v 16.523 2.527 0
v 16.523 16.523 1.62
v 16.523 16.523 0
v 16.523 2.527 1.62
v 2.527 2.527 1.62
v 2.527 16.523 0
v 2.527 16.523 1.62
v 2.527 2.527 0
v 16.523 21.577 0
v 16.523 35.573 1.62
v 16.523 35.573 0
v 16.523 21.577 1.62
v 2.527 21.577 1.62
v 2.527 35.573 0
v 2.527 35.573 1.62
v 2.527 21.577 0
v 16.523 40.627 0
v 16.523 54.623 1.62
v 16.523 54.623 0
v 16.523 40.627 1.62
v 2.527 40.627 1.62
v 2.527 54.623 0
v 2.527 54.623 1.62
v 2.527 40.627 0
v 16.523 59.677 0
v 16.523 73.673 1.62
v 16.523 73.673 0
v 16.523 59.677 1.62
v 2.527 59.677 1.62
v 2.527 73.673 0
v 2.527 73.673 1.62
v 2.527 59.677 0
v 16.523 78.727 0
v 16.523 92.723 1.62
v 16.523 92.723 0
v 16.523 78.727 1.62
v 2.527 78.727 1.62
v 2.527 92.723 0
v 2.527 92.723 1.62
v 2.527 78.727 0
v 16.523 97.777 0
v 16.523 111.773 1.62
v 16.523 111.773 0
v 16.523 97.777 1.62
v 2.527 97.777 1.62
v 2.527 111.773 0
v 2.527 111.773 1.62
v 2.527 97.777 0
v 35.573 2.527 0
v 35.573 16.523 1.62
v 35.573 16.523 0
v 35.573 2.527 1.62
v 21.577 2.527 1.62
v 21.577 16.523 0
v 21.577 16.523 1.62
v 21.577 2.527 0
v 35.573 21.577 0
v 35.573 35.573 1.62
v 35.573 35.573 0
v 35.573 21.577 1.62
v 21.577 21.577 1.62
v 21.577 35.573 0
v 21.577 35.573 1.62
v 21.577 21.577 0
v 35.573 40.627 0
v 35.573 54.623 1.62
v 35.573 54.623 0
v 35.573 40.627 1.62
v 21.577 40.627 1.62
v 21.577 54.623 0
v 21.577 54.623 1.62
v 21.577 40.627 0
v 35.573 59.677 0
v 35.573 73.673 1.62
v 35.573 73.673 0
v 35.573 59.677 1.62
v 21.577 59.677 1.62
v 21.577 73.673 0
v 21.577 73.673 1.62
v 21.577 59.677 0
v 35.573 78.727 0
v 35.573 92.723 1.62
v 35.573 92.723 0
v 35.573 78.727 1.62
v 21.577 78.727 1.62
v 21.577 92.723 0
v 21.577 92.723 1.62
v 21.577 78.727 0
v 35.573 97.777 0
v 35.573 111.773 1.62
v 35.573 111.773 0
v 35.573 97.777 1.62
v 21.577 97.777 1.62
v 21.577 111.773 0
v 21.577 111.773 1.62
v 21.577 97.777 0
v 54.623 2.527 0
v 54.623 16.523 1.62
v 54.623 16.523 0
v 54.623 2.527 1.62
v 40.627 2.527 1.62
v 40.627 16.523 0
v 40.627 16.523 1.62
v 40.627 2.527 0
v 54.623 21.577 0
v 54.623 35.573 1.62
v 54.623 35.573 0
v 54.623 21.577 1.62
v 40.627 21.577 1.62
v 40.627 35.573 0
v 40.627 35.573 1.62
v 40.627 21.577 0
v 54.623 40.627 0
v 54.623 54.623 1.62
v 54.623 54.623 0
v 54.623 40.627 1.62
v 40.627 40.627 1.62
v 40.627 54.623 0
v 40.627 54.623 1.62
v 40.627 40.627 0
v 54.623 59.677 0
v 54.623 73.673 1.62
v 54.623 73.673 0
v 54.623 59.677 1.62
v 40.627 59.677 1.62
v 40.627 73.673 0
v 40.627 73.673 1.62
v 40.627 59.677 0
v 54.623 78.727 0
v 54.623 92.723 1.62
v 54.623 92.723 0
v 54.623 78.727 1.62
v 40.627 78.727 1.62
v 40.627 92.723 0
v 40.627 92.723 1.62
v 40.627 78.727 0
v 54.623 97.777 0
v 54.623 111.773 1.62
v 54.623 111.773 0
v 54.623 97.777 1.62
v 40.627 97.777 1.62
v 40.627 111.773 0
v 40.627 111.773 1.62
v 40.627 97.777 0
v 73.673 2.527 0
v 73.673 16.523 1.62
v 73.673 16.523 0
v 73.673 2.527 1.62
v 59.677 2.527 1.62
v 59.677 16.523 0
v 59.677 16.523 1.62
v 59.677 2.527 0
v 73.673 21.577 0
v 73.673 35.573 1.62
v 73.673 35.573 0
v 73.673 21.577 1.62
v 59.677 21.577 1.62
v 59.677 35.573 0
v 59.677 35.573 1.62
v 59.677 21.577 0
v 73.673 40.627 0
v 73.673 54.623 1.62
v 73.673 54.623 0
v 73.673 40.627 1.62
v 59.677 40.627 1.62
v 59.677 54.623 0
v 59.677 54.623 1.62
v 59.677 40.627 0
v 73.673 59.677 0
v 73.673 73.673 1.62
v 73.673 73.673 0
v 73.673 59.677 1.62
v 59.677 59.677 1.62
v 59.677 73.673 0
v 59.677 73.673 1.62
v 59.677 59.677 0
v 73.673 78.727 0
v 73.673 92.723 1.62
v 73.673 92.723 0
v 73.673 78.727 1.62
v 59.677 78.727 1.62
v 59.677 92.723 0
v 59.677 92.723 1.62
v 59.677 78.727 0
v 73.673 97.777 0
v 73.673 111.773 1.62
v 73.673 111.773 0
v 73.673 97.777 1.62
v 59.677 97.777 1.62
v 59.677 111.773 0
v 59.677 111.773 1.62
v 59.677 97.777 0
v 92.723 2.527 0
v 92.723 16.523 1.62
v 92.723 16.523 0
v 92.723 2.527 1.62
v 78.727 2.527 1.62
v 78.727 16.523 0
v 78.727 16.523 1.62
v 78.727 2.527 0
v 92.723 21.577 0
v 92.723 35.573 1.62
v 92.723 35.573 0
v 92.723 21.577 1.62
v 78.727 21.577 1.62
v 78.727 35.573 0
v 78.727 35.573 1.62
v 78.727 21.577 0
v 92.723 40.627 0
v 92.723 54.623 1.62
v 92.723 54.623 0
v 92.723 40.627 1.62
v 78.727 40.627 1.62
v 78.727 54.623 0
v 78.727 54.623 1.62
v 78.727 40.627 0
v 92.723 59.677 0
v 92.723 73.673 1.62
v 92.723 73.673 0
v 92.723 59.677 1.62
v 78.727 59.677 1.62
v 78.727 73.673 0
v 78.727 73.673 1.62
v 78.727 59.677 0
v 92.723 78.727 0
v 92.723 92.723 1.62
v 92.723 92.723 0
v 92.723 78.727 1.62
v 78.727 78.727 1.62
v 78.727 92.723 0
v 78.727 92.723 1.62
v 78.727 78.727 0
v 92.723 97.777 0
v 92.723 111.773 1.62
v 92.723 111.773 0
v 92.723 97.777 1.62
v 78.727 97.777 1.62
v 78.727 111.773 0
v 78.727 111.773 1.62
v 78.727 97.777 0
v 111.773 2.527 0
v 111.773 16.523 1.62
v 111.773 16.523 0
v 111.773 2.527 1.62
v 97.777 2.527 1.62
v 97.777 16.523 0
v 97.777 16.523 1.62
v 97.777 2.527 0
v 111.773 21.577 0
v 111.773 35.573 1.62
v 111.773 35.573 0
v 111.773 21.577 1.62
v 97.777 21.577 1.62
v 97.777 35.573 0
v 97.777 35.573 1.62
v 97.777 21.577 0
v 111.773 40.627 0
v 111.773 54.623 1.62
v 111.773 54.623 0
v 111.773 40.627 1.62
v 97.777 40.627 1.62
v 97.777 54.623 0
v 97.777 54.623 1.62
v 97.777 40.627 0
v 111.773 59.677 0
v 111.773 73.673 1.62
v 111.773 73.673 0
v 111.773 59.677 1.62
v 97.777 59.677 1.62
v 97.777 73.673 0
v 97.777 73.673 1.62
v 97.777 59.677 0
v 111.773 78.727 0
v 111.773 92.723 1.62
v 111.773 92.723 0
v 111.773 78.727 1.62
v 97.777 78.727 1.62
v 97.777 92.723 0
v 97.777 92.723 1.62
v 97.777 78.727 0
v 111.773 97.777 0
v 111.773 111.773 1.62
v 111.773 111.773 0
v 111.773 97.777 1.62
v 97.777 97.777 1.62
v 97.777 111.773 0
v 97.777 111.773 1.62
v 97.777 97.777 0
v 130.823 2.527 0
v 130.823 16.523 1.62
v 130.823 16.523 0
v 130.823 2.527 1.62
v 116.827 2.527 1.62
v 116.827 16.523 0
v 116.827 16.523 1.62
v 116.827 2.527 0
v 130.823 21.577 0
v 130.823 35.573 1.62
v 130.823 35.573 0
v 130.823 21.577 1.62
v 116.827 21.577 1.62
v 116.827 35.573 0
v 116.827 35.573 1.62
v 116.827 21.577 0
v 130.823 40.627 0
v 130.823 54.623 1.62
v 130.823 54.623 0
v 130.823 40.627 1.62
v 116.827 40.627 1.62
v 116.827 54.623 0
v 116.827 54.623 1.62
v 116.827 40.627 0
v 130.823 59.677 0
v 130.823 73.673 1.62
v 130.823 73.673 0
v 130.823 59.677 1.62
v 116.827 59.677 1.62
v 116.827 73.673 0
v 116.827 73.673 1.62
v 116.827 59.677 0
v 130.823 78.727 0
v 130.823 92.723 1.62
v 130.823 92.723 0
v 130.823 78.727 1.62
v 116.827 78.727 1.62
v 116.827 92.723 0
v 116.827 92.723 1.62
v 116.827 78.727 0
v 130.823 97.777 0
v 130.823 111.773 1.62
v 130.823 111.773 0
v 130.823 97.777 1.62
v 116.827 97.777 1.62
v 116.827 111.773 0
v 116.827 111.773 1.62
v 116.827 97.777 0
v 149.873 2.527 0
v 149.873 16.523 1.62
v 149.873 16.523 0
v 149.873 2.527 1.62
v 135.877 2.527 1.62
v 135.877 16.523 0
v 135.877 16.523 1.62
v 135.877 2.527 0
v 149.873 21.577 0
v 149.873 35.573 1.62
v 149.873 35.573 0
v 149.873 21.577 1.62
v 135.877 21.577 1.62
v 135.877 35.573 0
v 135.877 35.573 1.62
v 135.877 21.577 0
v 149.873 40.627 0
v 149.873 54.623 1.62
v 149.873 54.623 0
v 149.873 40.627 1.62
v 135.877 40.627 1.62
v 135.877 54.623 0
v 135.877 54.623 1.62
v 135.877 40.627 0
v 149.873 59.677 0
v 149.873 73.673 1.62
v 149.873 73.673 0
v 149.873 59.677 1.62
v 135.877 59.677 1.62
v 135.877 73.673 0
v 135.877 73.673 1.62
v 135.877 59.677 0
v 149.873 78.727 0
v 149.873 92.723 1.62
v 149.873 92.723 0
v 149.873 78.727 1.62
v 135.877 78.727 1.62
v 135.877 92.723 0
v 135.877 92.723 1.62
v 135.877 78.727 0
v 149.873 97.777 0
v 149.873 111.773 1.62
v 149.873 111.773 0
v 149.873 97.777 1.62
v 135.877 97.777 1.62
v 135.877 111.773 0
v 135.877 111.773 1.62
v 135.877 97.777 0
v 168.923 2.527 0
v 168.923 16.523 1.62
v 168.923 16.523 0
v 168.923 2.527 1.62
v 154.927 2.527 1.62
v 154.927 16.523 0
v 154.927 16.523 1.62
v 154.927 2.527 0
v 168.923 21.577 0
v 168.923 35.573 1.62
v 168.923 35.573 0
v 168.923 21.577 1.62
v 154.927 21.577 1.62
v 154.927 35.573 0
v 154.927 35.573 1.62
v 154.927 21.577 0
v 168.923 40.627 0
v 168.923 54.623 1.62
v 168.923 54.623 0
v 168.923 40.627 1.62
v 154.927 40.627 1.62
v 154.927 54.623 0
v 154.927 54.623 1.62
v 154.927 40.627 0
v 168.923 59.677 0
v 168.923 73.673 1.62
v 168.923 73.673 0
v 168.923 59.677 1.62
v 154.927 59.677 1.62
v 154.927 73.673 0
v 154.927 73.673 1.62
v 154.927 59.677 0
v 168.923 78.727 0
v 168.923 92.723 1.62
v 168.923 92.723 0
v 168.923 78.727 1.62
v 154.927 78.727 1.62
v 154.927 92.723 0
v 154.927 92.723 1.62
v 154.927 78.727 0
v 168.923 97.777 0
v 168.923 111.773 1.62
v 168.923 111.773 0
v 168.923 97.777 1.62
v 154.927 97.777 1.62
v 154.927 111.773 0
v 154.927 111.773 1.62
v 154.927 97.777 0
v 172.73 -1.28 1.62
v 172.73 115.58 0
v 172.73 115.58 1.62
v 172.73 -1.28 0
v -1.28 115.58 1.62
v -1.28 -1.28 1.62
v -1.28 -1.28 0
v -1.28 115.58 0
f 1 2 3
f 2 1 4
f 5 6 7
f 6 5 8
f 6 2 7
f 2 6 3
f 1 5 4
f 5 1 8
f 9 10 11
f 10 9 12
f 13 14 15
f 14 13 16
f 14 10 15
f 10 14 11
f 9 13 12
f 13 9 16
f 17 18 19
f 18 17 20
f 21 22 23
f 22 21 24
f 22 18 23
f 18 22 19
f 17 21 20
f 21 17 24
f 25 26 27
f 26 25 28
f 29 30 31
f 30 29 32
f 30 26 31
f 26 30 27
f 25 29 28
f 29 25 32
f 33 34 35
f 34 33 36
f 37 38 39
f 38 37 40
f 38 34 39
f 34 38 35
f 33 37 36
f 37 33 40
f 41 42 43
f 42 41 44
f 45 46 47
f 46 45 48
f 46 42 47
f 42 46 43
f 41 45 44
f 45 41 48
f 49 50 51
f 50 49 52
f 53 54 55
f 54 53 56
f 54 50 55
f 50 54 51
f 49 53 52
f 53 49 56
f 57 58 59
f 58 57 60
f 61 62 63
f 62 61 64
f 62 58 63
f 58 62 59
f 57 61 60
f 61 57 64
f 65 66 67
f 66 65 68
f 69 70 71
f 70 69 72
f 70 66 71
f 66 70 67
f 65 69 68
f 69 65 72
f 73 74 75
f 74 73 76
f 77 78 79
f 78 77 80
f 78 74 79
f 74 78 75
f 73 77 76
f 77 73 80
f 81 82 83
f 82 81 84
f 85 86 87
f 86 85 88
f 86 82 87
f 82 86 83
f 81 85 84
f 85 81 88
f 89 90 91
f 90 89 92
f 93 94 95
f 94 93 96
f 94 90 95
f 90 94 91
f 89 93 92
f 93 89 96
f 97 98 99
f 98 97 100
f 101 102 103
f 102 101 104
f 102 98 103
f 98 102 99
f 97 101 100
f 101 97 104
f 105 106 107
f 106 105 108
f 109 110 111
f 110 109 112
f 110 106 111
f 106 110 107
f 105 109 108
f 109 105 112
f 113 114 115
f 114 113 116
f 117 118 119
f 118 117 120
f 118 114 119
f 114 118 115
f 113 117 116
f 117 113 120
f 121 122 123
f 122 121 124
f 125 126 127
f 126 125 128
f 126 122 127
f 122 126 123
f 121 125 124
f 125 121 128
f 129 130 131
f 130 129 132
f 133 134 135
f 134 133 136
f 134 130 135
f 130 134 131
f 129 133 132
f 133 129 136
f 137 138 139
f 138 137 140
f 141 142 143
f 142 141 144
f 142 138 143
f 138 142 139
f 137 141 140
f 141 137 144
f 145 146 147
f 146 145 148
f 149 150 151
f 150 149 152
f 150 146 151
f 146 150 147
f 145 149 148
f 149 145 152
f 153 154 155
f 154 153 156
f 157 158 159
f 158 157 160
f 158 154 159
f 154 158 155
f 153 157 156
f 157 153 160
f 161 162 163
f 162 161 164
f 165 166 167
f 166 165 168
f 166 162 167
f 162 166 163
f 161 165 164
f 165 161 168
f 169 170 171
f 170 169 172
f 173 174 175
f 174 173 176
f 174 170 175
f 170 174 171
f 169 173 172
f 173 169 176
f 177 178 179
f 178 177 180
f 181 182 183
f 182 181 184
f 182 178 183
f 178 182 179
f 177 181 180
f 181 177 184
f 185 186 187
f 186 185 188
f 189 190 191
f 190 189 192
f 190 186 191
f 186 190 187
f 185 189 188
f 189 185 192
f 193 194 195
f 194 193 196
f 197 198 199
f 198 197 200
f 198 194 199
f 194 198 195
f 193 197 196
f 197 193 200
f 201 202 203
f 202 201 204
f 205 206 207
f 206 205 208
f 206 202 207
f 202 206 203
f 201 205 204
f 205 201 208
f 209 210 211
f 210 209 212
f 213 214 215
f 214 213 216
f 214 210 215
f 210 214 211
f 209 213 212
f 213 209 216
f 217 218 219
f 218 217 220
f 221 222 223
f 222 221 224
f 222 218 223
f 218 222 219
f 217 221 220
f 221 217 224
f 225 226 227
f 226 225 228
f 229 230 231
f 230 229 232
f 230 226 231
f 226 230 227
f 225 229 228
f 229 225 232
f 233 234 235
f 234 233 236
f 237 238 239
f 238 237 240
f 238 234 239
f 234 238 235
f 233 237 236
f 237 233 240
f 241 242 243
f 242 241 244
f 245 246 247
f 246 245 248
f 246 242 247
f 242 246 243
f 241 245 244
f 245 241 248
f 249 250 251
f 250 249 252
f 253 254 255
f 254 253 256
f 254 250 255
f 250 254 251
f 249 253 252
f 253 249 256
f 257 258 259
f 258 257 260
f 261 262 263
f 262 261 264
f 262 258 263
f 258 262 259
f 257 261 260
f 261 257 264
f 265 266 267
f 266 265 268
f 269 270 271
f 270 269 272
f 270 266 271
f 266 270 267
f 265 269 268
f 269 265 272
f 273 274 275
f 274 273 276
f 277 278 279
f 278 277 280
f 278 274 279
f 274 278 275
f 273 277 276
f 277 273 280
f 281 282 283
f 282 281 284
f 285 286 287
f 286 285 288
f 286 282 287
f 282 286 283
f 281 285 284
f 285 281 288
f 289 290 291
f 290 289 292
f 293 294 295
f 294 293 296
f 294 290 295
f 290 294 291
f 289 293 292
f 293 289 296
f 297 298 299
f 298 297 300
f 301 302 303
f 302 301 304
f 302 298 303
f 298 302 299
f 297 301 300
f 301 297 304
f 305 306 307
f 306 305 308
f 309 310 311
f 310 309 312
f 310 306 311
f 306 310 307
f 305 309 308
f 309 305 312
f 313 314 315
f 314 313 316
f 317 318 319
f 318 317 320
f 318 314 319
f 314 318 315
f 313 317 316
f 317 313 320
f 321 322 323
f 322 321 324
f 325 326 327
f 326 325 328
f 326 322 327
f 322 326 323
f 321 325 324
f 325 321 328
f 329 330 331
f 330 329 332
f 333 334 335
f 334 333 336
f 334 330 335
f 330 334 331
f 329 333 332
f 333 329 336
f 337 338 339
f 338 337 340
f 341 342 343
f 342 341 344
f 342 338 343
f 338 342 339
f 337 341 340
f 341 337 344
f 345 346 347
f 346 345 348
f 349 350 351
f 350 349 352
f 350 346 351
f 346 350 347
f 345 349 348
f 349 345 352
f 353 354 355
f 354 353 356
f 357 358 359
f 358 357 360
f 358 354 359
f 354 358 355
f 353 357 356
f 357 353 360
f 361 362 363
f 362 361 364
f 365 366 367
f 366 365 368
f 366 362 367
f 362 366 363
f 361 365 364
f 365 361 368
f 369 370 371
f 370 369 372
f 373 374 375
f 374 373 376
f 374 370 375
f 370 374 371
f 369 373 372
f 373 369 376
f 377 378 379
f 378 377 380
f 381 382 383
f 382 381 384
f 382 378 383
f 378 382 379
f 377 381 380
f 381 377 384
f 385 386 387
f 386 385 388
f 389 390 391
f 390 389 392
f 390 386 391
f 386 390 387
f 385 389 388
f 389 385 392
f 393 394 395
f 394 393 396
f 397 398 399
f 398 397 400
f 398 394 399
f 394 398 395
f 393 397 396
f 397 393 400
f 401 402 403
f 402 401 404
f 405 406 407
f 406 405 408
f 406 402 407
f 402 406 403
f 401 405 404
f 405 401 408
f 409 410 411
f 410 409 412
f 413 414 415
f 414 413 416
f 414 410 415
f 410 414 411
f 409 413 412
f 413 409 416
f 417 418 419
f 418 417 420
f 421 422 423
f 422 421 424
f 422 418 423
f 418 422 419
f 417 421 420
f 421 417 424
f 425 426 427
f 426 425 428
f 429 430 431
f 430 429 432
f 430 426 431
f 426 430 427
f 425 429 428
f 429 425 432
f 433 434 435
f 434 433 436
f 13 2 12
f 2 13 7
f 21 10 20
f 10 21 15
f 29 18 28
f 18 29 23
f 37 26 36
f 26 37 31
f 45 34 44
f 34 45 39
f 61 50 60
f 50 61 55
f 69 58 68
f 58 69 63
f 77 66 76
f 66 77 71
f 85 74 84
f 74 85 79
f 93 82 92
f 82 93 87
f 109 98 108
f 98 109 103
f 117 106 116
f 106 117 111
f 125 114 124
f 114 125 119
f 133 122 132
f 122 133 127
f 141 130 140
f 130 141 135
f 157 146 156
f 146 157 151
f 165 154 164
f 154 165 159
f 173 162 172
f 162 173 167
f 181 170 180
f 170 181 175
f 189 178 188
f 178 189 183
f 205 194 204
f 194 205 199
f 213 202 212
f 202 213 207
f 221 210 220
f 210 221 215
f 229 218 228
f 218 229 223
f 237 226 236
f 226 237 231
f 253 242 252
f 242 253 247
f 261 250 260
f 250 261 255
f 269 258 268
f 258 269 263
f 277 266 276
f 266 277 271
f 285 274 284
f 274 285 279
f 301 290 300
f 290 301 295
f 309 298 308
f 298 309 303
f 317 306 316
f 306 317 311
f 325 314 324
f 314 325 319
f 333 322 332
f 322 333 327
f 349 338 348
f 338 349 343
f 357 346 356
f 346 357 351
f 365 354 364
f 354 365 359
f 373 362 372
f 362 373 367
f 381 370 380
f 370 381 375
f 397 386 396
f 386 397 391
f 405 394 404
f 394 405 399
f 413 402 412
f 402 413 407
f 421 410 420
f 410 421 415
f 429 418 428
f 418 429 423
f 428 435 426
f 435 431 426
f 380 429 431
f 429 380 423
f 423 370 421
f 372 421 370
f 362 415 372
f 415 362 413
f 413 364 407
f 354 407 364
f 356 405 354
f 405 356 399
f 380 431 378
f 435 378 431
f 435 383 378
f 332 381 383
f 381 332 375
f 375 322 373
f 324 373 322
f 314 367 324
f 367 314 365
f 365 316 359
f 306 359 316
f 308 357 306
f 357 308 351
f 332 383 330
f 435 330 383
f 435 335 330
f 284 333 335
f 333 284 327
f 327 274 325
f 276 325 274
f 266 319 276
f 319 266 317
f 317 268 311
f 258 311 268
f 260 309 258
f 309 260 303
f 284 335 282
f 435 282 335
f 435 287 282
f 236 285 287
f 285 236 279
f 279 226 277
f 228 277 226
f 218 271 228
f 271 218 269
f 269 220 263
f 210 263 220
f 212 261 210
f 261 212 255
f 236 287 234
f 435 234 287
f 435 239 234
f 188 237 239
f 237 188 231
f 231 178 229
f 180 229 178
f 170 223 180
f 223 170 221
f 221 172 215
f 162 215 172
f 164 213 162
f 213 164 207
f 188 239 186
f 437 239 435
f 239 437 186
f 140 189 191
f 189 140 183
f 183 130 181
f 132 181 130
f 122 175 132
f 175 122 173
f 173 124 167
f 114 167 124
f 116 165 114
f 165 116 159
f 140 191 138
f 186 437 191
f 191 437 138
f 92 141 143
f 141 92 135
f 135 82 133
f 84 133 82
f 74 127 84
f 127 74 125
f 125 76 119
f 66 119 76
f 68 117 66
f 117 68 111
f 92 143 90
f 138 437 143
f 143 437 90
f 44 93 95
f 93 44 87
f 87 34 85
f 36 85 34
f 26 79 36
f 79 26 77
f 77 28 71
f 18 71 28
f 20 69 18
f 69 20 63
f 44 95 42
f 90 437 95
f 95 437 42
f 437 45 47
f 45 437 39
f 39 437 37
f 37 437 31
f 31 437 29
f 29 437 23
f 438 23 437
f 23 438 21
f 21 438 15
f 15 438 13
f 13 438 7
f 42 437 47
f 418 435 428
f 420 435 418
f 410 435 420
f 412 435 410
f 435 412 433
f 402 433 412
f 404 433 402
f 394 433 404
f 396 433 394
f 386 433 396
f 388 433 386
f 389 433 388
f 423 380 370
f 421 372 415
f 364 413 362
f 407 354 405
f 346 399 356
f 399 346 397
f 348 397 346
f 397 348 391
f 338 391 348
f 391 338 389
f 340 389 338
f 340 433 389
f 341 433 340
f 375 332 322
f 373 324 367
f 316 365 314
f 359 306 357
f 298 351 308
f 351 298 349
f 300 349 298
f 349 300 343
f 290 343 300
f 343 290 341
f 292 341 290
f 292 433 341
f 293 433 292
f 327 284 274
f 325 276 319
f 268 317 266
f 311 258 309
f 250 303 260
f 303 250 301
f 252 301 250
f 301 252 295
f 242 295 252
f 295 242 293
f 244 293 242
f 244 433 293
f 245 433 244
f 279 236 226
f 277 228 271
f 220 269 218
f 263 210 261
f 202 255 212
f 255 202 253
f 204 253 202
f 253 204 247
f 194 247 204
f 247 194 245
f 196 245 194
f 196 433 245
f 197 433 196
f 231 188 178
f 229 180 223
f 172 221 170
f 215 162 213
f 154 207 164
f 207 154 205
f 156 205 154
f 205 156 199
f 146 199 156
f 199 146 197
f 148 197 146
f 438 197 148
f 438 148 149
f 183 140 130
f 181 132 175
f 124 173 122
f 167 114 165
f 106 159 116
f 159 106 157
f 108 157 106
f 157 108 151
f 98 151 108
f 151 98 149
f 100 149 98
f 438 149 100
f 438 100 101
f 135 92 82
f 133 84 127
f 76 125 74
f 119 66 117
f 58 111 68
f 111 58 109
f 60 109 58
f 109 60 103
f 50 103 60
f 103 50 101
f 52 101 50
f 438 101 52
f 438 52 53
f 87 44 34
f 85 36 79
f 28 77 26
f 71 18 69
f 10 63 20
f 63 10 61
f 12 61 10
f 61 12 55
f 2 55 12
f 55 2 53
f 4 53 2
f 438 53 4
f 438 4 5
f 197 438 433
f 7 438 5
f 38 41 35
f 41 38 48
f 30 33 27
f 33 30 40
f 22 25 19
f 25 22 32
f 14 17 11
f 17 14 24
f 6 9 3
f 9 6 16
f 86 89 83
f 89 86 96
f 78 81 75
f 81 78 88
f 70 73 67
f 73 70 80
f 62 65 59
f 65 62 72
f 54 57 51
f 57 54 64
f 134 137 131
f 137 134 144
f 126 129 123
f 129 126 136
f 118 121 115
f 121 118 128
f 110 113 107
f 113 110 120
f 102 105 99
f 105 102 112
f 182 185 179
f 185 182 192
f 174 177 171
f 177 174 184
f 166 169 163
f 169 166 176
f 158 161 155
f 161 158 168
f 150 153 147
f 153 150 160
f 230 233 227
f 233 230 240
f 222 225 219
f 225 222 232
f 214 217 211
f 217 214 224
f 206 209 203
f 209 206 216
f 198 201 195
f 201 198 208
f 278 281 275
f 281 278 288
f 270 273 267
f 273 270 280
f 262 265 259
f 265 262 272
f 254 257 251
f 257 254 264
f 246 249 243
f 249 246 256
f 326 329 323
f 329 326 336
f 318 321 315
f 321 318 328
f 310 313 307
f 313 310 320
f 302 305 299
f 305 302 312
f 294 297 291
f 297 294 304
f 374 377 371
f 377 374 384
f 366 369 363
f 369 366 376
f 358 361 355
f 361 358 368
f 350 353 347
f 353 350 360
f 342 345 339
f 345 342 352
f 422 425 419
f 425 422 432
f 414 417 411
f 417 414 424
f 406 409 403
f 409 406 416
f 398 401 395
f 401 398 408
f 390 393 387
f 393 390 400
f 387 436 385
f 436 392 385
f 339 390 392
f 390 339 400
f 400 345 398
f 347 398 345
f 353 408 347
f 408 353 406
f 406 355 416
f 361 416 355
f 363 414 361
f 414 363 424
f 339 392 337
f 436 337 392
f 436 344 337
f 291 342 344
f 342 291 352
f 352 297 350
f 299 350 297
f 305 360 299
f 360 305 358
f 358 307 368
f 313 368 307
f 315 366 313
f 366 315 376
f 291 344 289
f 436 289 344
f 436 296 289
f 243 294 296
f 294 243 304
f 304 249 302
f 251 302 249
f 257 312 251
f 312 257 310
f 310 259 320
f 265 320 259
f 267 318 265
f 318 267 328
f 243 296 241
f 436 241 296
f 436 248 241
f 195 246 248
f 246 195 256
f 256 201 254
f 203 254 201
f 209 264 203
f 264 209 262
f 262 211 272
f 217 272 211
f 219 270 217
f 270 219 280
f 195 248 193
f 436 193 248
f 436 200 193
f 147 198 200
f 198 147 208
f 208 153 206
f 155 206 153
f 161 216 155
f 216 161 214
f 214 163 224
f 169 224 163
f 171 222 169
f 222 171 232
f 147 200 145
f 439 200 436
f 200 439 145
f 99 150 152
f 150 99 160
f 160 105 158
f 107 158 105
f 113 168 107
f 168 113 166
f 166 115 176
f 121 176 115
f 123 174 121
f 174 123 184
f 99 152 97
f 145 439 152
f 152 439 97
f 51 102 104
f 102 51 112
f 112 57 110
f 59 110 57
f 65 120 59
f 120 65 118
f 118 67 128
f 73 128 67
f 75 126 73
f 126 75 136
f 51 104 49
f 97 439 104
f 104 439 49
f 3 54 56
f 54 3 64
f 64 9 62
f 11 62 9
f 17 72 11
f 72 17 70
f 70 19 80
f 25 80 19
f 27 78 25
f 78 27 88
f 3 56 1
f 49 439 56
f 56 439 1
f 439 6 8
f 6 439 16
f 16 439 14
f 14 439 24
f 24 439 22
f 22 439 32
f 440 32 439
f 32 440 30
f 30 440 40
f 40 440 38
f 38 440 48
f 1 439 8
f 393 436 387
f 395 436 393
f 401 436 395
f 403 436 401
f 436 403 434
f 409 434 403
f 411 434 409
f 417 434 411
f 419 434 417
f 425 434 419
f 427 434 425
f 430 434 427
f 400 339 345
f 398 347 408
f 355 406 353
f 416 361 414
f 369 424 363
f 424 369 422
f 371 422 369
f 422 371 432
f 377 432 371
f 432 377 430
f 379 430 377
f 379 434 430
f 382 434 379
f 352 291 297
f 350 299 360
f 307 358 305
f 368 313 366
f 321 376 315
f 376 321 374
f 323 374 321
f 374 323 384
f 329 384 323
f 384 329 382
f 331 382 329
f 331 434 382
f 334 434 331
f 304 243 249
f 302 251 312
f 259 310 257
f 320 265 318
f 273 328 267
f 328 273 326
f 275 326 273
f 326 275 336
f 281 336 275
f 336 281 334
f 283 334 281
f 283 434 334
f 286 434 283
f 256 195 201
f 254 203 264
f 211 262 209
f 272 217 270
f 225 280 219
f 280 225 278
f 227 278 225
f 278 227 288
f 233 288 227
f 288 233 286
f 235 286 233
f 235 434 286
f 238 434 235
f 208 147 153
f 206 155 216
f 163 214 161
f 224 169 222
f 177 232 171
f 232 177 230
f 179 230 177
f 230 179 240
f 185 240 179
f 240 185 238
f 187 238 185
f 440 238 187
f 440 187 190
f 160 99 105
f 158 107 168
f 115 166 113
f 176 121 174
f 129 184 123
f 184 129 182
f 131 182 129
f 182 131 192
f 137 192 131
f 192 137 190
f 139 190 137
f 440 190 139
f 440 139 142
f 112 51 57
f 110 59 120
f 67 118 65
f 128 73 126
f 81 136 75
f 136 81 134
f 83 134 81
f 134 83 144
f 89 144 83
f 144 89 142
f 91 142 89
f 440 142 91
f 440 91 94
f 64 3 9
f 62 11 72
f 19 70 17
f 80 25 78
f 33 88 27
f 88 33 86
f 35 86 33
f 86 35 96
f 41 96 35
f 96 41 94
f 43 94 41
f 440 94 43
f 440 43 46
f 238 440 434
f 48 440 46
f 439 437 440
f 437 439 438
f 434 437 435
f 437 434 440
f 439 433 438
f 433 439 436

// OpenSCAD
// non-design measurements
key_spacing = 19.05;
key_cutout_w = .551*25.4;

wall_thicc = 1.28;
pcb_thickness = 1.62;
difference(){
    translate([-wall_thicc,-wall_thicc,0])
        cube([key_spacing*9+2*wall_thicc, key_spacing*6+2*wall_thicc, pcb_thickness]);
    for(i=[.5:9.5],j=[.5:6.5]){
        translate([i*key_spacing, j*key_spacing, pcb_thickness/2]) cube([key_cutout_w,key_cutout_w,pcb_thickness*2], center=true);
    }
}
